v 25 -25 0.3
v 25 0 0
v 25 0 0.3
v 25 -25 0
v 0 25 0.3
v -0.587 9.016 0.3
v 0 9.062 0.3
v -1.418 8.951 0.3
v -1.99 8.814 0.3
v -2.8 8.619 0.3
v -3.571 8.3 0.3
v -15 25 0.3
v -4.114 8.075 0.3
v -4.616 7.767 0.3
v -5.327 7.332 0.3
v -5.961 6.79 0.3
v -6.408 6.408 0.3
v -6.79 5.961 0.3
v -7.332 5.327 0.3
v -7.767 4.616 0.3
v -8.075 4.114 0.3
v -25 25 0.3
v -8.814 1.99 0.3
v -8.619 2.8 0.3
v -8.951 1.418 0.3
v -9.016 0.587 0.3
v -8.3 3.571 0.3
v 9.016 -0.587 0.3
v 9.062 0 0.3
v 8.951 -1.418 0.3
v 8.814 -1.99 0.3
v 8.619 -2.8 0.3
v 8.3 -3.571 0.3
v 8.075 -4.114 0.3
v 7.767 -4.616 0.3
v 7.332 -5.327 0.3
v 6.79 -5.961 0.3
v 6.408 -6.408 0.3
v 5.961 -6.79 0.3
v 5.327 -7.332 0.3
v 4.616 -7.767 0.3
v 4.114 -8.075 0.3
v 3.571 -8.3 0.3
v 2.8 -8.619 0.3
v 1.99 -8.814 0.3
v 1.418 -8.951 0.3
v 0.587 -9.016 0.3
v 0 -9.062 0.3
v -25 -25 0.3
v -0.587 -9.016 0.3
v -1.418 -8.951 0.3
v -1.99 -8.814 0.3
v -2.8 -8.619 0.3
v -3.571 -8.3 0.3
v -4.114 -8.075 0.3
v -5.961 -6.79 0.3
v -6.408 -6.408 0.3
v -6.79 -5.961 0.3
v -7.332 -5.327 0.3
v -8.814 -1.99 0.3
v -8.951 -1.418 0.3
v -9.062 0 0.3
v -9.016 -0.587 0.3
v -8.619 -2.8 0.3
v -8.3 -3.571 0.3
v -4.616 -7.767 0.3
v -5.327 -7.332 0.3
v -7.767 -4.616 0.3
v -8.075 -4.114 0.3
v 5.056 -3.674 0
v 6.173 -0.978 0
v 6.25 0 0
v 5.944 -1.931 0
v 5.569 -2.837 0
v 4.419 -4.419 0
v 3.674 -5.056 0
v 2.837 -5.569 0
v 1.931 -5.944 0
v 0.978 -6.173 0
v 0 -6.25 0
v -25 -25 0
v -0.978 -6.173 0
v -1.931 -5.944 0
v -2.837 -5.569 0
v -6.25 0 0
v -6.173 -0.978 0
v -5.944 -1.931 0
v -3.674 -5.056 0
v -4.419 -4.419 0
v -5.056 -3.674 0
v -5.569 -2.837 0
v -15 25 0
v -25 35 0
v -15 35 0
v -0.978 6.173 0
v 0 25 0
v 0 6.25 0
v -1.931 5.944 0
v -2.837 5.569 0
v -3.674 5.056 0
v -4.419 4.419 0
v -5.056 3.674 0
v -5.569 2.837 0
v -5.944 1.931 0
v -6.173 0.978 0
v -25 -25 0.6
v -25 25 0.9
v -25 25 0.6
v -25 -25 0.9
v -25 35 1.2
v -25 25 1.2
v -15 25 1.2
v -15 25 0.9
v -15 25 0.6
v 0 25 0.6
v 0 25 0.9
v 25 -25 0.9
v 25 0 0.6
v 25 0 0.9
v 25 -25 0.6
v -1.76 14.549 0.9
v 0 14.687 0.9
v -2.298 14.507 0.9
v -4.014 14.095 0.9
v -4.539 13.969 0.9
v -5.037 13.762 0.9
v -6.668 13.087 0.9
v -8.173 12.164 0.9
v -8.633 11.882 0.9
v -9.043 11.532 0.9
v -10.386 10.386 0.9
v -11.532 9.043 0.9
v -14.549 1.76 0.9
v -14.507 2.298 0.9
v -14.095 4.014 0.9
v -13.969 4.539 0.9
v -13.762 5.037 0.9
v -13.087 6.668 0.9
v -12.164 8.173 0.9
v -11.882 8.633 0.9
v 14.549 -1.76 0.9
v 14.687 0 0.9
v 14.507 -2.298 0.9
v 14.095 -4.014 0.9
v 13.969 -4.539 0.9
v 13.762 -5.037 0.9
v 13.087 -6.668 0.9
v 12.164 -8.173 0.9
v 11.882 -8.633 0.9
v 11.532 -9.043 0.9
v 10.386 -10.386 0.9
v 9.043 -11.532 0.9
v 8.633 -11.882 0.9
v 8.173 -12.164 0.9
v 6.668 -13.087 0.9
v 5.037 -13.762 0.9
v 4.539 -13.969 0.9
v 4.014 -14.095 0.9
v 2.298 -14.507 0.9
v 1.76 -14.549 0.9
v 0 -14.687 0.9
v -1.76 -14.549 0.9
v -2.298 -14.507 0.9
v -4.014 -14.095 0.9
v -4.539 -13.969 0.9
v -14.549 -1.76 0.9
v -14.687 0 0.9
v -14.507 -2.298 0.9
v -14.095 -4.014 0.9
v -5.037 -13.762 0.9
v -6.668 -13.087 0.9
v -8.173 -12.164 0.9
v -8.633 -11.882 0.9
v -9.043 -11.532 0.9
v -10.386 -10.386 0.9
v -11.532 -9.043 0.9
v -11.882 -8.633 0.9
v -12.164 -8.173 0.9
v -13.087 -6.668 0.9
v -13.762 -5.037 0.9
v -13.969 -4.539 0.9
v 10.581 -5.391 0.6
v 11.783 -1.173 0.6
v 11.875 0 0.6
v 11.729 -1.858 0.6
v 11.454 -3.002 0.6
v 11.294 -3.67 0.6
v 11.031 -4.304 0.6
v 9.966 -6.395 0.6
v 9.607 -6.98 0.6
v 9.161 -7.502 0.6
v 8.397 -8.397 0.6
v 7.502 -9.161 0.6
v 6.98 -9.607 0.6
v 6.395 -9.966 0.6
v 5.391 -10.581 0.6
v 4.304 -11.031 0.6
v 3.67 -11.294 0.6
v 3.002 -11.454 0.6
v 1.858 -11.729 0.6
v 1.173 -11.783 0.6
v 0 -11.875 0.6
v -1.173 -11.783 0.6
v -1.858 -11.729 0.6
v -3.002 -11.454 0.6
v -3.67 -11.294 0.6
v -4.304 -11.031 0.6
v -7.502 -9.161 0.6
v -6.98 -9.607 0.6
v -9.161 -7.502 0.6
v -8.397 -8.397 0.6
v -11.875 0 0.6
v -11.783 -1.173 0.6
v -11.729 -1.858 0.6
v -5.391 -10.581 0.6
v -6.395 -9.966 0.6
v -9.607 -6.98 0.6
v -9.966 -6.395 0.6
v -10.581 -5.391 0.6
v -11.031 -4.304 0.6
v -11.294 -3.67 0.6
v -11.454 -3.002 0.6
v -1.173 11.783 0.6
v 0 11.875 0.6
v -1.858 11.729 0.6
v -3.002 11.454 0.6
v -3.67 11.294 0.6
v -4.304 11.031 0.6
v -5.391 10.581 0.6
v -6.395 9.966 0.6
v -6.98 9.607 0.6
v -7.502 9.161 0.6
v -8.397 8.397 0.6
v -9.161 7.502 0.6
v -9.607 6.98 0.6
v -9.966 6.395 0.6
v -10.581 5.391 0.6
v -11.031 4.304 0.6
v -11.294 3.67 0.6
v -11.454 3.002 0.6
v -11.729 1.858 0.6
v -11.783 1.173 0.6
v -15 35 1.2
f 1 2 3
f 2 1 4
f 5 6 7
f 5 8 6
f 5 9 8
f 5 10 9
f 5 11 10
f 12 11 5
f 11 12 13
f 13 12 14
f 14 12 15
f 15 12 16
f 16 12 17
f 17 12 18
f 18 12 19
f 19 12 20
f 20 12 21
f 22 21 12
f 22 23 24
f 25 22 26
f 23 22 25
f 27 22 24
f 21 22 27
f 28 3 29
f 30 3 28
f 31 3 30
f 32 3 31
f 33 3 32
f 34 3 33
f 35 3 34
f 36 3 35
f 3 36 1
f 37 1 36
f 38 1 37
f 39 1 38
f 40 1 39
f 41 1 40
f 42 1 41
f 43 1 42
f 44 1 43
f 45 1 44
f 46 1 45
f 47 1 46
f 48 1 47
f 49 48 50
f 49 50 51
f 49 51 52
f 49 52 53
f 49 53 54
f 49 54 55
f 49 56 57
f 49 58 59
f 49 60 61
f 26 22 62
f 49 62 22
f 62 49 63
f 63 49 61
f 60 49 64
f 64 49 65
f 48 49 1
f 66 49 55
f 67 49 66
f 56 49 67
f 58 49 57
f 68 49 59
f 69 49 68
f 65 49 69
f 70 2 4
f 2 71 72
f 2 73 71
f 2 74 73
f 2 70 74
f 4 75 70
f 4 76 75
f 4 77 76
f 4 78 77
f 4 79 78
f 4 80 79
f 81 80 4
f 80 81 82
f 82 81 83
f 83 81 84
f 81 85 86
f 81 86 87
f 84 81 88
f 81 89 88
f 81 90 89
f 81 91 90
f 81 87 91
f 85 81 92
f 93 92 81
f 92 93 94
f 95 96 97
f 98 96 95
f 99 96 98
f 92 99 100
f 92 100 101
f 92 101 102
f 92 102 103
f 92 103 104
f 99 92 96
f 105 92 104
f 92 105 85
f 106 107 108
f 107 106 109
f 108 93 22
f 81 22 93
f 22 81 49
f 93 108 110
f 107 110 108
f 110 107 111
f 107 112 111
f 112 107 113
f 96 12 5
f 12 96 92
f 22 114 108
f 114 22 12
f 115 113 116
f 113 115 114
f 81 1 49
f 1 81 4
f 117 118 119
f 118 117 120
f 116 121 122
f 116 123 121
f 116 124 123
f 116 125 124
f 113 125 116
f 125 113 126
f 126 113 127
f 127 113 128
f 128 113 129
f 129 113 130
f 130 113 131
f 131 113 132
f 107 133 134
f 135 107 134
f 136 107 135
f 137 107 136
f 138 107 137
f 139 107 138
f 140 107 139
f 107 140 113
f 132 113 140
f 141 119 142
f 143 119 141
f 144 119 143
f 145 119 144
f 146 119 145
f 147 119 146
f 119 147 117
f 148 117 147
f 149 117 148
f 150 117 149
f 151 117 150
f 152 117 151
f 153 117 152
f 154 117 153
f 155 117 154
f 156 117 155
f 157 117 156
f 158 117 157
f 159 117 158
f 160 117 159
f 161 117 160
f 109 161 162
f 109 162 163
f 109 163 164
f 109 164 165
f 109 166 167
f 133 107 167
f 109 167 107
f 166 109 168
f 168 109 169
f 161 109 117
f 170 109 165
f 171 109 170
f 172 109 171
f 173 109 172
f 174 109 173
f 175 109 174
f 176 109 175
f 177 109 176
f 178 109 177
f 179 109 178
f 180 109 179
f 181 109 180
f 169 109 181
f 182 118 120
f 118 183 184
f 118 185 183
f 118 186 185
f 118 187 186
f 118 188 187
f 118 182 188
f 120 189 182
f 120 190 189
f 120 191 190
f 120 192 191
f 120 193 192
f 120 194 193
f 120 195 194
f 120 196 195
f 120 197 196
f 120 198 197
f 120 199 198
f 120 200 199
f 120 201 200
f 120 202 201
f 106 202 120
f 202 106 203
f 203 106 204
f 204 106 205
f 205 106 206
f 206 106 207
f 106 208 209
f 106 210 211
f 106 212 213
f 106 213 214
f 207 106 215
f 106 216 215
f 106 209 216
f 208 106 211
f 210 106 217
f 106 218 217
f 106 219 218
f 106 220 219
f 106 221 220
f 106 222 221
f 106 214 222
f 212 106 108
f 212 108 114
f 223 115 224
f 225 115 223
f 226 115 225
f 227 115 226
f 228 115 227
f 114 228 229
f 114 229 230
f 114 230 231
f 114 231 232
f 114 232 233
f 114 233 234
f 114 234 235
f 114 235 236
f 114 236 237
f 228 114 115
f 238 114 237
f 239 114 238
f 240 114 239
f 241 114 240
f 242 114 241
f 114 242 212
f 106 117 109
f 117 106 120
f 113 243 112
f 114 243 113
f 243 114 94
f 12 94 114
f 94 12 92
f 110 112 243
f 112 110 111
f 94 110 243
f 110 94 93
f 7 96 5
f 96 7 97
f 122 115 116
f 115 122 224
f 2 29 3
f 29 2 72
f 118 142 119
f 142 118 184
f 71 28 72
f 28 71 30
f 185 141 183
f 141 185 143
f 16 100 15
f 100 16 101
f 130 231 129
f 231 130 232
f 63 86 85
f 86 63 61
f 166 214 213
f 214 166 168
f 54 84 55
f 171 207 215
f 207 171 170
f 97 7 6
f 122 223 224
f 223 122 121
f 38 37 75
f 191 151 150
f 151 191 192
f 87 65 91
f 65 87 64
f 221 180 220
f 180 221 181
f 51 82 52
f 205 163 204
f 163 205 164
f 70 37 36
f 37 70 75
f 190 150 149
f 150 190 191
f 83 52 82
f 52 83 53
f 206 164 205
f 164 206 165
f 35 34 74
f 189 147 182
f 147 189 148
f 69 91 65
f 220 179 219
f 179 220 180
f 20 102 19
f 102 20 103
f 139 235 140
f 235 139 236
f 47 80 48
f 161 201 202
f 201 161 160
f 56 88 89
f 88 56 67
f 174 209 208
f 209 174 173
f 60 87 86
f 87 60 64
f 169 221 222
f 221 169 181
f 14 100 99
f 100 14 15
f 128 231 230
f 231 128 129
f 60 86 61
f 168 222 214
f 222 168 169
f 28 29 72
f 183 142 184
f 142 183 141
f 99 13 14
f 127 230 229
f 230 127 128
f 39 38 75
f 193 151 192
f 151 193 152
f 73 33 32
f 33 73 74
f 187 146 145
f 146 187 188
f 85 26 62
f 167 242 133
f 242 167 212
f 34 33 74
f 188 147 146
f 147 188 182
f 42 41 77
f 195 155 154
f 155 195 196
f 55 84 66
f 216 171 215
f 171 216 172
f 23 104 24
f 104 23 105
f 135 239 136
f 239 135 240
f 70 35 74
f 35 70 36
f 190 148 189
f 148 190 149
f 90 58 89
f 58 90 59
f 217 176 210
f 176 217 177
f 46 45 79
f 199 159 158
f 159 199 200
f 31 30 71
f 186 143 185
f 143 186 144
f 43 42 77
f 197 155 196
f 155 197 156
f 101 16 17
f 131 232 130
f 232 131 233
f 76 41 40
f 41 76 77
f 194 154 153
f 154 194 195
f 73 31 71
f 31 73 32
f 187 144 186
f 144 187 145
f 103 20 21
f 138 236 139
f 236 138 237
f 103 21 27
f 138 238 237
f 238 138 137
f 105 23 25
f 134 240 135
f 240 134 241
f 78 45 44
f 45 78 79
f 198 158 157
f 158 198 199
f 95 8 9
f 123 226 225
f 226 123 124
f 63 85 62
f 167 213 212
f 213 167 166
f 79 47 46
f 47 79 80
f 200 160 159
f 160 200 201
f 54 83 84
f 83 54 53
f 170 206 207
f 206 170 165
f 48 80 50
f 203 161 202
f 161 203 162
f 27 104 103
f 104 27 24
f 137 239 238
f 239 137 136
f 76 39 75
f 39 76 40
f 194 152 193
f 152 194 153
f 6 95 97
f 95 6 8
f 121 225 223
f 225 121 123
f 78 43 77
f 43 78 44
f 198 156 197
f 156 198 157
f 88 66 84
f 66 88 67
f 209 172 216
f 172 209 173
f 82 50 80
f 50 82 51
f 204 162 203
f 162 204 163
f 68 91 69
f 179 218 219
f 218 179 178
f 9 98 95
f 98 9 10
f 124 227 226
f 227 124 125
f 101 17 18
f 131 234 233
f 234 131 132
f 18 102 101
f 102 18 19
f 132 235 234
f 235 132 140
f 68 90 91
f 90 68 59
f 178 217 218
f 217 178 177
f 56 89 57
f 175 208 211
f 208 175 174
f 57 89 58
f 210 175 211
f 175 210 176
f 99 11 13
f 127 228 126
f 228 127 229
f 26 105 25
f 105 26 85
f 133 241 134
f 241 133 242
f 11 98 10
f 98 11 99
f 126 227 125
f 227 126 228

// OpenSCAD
//dual extruder test
yellow = 0;
blue = 1;
u = 50;
h = .3;
layers=4;
difference()
{
    main();
    cube([u/2+1,u/2+1,30]);
    cylinder(r1=u/8, r2=u/2, h=2, $fn=40);
}


module main()
{
    color("yellow")
    if (yellow == 1)
    {
        layer(1);
        layer(3);
        
        translate([u/2,-u/2,0])
            cube([u/5,u/5,layers*h]);
    }



    color("blue")
    if (blue == 1)
    {
        layer(0);
        layer(2);
        translate([-u/2,u/2,0])
            cube([u/5,u/5,layers*h]);
    }
}

module layer(a)
{
    translate([-u/2,-u/2, a * h])
        cube([u, u, h]);
}
